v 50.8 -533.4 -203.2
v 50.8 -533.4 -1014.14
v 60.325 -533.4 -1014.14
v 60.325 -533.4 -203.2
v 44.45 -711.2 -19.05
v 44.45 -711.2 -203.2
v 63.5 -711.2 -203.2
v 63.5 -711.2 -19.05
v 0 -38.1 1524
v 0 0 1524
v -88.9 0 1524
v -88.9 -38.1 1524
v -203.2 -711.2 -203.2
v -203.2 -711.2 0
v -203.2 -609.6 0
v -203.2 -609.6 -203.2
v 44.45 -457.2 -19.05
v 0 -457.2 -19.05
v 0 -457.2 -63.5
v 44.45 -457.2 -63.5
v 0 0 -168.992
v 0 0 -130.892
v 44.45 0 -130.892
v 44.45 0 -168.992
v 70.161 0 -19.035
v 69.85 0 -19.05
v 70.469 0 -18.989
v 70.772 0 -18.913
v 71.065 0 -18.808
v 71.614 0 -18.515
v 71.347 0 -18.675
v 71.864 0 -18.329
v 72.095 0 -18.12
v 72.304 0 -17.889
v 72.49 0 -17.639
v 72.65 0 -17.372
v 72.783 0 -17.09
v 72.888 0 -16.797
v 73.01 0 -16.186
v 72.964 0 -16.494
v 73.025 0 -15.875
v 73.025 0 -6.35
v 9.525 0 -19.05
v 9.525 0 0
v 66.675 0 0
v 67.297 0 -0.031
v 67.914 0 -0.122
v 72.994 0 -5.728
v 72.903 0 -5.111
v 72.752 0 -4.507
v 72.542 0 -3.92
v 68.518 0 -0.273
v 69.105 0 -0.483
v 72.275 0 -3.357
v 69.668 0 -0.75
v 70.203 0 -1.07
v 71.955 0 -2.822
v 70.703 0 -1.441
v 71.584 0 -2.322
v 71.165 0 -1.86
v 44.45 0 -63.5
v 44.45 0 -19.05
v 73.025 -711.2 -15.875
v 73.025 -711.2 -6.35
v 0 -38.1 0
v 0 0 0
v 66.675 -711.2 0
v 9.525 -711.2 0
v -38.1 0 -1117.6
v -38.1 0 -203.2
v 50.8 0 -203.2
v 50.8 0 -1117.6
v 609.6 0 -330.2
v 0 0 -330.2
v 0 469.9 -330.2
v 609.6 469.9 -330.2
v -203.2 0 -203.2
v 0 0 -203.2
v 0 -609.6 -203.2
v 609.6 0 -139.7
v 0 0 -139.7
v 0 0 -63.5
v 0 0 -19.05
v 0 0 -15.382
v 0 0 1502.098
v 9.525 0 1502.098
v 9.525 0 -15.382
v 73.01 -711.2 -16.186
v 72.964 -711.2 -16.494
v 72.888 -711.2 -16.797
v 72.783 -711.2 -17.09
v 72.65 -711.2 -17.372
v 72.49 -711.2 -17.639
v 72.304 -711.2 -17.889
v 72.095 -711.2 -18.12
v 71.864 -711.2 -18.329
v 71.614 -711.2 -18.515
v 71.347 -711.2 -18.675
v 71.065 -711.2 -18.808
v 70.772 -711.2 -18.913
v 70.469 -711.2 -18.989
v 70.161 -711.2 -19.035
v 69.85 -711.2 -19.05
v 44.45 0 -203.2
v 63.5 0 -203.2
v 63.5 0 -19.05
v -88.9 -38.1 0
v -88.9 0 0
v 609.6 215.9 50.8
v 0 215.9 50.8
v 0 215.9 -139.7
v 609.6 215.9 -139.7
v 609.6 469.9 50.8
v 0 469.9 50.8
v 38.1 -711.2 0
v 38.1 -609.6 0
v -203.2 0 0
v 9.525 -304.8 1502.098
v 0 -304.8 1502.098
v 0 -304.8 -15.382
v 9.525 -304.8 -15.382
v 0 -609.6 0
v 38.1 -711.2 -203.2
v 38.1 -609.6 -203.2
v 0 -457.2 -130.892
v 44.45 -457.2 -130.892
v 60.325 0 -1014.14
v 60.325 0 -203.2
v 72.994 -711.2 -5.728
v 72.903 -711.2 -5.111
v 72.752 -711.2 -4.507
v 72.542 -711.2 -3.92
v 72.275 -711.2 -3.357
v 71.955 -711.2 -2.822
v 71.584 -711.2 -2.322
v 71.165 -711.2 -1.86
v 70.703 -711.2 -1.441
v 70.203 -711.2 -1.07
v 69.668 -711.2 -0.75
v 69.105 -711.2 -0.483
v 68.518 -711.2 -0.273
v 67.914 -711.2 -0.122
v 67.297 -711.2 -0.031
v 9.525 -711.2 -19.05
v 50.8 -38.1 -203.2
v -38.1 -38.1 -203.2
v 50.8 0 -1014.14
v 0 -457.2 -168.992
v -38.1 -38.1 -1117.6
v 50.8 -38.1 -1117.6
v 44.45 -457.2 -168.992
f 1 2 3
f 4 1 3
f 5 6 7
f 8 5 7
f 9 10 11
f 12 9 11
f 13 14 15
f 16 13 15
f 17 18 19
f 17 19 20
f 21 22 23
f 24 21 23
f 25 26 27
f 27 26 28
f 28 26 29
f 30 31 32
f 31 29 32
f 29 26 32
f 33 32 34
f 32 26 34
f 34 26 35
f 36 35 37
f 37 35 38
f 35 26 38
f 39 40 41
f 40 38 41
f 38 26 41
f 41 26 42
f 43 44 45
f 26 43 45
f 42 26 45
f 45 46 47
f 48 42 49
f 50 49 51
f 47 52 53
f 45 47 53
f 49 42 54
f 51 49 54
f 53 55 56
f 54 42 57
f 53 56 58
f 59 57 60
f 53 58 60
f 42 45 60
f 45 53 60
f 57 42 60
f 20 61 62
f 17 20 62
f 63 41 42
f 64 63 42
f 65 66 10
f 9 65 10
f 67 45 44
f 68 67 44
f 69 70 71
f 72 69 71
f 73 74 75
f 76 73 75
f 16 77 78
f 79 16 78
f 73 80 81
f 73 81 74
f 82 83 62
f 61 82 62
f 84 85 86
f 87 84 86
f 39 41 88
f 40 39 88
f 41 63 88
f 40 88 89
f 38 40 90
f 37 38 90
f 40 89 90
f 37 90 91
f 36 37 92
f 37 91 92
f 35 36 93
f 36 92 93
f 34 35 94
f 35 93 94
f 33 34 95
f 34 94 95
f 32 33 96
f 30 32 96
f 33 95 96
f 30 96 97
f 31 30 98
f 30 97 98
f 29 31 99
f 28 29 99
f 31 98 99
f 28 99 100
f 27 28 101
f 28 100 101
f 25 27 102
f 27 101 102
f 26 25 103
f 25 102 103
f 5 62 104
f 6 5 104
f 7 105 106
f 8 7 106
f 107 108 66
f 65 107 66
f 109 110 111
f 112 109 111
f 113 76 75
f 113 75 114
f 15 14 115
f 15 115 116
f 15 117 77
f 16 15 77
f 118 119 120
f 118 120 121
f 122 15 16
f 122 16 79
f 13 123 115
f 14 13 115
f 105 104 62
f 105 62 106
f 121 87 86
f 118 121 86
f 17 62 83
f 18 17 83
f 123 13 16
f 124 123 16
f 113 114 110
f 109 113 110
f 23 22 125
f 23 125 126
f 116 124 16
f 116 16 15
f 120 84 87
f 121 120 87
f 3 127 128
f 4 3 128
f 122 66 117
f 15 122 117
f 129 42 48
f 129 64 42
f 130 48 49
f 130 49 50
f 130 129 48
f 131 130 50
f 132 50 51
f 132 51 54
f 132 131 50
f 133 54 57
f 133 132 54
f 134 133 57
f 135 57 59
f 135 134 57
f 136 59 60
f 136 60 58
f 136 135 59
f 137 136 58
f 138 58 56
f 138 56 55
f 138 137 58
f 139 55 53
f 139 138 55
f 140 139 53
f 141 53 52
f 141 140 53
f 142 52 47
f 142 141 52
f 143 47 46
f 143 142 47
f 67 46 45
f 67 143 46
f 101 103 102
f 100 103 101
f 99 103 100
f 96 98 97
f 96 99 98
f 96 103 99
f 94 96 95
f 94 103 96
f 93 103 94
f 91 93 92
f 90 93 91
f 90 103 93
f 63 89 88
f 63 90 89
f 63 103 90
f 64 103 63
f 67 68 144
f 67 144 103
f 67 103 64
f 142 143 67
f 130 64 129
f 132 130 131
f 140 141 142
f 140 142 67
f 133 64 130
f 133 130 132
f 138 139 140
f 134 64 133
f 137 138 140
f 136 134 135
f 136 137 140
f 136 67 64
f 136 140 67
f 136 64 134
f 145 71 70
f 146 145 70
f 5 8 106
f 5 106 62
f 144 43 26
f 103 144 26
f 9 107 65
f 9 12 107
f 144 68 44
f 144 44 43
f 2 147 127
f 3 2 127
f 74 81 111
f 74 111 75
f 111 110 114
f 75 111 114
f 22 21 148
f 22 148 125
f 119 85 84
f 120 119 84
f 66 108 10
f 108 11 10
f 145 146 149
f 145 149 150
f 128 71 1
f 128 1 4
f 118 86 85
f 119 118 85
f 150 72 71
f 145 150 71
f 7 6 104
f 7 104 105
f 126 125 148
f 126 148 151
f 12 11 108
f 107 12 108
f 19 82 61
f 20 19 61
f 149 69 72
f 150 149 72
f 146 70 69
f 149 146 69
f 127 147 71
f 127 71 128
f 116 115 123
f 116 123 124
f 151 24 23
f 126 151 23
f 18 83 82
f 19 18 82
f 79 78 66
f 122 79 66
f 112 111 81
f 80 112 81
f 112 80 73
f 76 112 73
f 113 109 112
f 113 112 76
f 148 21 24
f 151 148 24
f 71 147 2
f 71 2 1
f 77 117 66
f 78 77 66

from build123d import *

# Parameters (mm, degrees)
F1_DEPTH      = 38.1
F2_DEPTH      = 304.8
F0_W          = 9.525
F0_H          = 810.9396522522
F3_DEPTH      = 609.6
F4_DEPTH      = 457.2
F0_W_2        = 44.45
F0_H_2        = 38.1
F5_W          = 101.6
F5_H          = 203.2
F6_DEPTH      = 38.1
F6_DEPTH_BACK = 203.2
F7_DEPTH      = 711.2
F8_DEPTH      = 711.2
F9_DEPTH      = 533.4
F11_DEPTH     = 609.6
F12_R         = 6.35
F13_R         = 3.175


with BuildPart() as f1:
    # F0 (on Front) → F1 (new body)
    with BuildSketch(Plane.XZ):
        Polygon((-88.9, 0), (0, 0), (0, 1502.098441124), (0, 1524), (-88.9, 1524), align=None)
    extrude(amount=F1_DEPTH)


with BuildPart() as f1b:
    # F0 (on Front) → F1, piece 2 (new body)
    with BuildSketch(Plane.XZ):
        Polygon((0, -203.2), (-38.1, -203.2), (-38.1, -1117.6), (50.8, -1117.6), (50.8, -1014.1396522522), (50.8, -203.2), (44.45, -203.2), align=None)
    extrude(amount=F1_DEPTH)


with BuildPart() as f2:
    # F0 (on Front) → F2 (new body)
    with BuildSketch(Plane.XZ):
        Polygon((0, 1502.098441124), (0, 0), (0, -15.3818884864), (9.525, -15.3818884864), (9.525, 0), (9.525, 1502.098441124), align=None)
    extrude(amount=F2_DEPTH)


with BuildPart() as f2b:
    # F0 (on Front) → F2, piece 2 (new body)
    with BuildSketch(Plane.XZ):
        with Locations((55.5625, -608.6698261261)):
            Rectangle(F0_W, F0_H)
    extrude(amount=F2_DEPTH)

    # F0 (on Front) → F9 (join)
    with BuildSketch(Plane.XZ):
        with Locations((55.5625, -608.6698261261)):
            Rectangle(F0_W, F0_H)
    extrude(amount=F9_DEPTH)


with BuildPart() as f3:
    # F0 (on Front) → F3 (new body)
    with BuildSketch(Plane.XZ):
        Polygon((0, -15.3818884864), (0, 0), (-88.9, 0), (-203.2, 0), (-203.2, -203.2), (-38.1, -203.2), (0, -203.2), (0, -168.9922213554), (0, -130.8922213554), (0, -63.5), (0, -19.05), align=None)
    extrude(amount=F3_DEPTH)


with BuildPart() as f4:
    # F0 (on Front) → F4 (new body)
    with BuildSketch(Plane.XZ):
        Polygon((9.525, -19.05), (0, -19.05), (0, -63.5), (44.45, -63.5), (44.45, -19.05), align=None)
    extrude(amount=F4_DEPTH)


with BuildPart() as f4b:
    # F0 (on Front) → F4, piece 2 (new body)
    with BuildSketch(Plane.XZ):
        with Locations((22.225, -149.9422213554)):
            Rectangle(F0_W_2, F0_H_2)
    extrude(amount=F4_DEPTH)


with BuildPart() as f6:
    # F5 (on face) → F6 (new body, two sides)
    with BuildSketch(Plane.YZ) as f6_sk:
        with Locations((-660.4, -101.6)):
            Rectangle(F5_W, F5_H)
    extrude(amount=F6_DEPTH)
    extrude(f6_sk.sketch, amount=-F6_DEPTH_BACK)


with BuildPart() as f7:
    # F0 (on Front) → F7 (new body, through all)
    with BuildSketch(Plane.XZ):
        Polygon((44.45, -19.05), (44.45, -63.5), (44.45, -130.8922213554), (44.45, -168.9922213554), (44.45, -203.2), (50.8, -203.2), (60.325, -203.2), (63.5, -203.2), (63.5, -19.05), align=None)
    extrude(amount=F7_DEPTH)


with BuildPart() as f8:
    # F0 (on Front) → F8 (new body, through all)
    with BuildSketch(Plane.XZ):
        Polygon((9.525, 0), (9.525, -15.3818884864), (9.525, -19.05), (44.45, -19.05), (63.5, -19.05), (73.025, -19.05), (73.025, 0), align=None)
    extrude(amount=F8_DEPTH)

    # F12
    f12_edges = [f8.edges().sort_by_distance(p)[0] for p in [
        (73.025, -355.6, 0),
    ]]
    fillet(f12_edges, radius=F12_R)

    # F13
    f13_edges = [f8.edges().sort_by_distance(p)[0] for p in [
        (73.025, -355.6, -19.05),
    ]]
    fillet(f13_edges, radius=F13_R)


with BuildPart() as f11:
    # F10 (on Right) → F11 (new body)
    with BuildSketch(Plane.YZ):
        Polygon((215.9, -139.7), (0, -139.7), (0, -330.2), (469.9, -330.2), (469.9, 50.8), (215.9, 50.8), align=None)
    extrude(amount=F11_DEPTH)


solid = Compound([f1.part, f1b.part, f2.part, f2b.part, f3.part, f4.part, f4b.part, f6.part, f7.part, f8.part, f11.part])
